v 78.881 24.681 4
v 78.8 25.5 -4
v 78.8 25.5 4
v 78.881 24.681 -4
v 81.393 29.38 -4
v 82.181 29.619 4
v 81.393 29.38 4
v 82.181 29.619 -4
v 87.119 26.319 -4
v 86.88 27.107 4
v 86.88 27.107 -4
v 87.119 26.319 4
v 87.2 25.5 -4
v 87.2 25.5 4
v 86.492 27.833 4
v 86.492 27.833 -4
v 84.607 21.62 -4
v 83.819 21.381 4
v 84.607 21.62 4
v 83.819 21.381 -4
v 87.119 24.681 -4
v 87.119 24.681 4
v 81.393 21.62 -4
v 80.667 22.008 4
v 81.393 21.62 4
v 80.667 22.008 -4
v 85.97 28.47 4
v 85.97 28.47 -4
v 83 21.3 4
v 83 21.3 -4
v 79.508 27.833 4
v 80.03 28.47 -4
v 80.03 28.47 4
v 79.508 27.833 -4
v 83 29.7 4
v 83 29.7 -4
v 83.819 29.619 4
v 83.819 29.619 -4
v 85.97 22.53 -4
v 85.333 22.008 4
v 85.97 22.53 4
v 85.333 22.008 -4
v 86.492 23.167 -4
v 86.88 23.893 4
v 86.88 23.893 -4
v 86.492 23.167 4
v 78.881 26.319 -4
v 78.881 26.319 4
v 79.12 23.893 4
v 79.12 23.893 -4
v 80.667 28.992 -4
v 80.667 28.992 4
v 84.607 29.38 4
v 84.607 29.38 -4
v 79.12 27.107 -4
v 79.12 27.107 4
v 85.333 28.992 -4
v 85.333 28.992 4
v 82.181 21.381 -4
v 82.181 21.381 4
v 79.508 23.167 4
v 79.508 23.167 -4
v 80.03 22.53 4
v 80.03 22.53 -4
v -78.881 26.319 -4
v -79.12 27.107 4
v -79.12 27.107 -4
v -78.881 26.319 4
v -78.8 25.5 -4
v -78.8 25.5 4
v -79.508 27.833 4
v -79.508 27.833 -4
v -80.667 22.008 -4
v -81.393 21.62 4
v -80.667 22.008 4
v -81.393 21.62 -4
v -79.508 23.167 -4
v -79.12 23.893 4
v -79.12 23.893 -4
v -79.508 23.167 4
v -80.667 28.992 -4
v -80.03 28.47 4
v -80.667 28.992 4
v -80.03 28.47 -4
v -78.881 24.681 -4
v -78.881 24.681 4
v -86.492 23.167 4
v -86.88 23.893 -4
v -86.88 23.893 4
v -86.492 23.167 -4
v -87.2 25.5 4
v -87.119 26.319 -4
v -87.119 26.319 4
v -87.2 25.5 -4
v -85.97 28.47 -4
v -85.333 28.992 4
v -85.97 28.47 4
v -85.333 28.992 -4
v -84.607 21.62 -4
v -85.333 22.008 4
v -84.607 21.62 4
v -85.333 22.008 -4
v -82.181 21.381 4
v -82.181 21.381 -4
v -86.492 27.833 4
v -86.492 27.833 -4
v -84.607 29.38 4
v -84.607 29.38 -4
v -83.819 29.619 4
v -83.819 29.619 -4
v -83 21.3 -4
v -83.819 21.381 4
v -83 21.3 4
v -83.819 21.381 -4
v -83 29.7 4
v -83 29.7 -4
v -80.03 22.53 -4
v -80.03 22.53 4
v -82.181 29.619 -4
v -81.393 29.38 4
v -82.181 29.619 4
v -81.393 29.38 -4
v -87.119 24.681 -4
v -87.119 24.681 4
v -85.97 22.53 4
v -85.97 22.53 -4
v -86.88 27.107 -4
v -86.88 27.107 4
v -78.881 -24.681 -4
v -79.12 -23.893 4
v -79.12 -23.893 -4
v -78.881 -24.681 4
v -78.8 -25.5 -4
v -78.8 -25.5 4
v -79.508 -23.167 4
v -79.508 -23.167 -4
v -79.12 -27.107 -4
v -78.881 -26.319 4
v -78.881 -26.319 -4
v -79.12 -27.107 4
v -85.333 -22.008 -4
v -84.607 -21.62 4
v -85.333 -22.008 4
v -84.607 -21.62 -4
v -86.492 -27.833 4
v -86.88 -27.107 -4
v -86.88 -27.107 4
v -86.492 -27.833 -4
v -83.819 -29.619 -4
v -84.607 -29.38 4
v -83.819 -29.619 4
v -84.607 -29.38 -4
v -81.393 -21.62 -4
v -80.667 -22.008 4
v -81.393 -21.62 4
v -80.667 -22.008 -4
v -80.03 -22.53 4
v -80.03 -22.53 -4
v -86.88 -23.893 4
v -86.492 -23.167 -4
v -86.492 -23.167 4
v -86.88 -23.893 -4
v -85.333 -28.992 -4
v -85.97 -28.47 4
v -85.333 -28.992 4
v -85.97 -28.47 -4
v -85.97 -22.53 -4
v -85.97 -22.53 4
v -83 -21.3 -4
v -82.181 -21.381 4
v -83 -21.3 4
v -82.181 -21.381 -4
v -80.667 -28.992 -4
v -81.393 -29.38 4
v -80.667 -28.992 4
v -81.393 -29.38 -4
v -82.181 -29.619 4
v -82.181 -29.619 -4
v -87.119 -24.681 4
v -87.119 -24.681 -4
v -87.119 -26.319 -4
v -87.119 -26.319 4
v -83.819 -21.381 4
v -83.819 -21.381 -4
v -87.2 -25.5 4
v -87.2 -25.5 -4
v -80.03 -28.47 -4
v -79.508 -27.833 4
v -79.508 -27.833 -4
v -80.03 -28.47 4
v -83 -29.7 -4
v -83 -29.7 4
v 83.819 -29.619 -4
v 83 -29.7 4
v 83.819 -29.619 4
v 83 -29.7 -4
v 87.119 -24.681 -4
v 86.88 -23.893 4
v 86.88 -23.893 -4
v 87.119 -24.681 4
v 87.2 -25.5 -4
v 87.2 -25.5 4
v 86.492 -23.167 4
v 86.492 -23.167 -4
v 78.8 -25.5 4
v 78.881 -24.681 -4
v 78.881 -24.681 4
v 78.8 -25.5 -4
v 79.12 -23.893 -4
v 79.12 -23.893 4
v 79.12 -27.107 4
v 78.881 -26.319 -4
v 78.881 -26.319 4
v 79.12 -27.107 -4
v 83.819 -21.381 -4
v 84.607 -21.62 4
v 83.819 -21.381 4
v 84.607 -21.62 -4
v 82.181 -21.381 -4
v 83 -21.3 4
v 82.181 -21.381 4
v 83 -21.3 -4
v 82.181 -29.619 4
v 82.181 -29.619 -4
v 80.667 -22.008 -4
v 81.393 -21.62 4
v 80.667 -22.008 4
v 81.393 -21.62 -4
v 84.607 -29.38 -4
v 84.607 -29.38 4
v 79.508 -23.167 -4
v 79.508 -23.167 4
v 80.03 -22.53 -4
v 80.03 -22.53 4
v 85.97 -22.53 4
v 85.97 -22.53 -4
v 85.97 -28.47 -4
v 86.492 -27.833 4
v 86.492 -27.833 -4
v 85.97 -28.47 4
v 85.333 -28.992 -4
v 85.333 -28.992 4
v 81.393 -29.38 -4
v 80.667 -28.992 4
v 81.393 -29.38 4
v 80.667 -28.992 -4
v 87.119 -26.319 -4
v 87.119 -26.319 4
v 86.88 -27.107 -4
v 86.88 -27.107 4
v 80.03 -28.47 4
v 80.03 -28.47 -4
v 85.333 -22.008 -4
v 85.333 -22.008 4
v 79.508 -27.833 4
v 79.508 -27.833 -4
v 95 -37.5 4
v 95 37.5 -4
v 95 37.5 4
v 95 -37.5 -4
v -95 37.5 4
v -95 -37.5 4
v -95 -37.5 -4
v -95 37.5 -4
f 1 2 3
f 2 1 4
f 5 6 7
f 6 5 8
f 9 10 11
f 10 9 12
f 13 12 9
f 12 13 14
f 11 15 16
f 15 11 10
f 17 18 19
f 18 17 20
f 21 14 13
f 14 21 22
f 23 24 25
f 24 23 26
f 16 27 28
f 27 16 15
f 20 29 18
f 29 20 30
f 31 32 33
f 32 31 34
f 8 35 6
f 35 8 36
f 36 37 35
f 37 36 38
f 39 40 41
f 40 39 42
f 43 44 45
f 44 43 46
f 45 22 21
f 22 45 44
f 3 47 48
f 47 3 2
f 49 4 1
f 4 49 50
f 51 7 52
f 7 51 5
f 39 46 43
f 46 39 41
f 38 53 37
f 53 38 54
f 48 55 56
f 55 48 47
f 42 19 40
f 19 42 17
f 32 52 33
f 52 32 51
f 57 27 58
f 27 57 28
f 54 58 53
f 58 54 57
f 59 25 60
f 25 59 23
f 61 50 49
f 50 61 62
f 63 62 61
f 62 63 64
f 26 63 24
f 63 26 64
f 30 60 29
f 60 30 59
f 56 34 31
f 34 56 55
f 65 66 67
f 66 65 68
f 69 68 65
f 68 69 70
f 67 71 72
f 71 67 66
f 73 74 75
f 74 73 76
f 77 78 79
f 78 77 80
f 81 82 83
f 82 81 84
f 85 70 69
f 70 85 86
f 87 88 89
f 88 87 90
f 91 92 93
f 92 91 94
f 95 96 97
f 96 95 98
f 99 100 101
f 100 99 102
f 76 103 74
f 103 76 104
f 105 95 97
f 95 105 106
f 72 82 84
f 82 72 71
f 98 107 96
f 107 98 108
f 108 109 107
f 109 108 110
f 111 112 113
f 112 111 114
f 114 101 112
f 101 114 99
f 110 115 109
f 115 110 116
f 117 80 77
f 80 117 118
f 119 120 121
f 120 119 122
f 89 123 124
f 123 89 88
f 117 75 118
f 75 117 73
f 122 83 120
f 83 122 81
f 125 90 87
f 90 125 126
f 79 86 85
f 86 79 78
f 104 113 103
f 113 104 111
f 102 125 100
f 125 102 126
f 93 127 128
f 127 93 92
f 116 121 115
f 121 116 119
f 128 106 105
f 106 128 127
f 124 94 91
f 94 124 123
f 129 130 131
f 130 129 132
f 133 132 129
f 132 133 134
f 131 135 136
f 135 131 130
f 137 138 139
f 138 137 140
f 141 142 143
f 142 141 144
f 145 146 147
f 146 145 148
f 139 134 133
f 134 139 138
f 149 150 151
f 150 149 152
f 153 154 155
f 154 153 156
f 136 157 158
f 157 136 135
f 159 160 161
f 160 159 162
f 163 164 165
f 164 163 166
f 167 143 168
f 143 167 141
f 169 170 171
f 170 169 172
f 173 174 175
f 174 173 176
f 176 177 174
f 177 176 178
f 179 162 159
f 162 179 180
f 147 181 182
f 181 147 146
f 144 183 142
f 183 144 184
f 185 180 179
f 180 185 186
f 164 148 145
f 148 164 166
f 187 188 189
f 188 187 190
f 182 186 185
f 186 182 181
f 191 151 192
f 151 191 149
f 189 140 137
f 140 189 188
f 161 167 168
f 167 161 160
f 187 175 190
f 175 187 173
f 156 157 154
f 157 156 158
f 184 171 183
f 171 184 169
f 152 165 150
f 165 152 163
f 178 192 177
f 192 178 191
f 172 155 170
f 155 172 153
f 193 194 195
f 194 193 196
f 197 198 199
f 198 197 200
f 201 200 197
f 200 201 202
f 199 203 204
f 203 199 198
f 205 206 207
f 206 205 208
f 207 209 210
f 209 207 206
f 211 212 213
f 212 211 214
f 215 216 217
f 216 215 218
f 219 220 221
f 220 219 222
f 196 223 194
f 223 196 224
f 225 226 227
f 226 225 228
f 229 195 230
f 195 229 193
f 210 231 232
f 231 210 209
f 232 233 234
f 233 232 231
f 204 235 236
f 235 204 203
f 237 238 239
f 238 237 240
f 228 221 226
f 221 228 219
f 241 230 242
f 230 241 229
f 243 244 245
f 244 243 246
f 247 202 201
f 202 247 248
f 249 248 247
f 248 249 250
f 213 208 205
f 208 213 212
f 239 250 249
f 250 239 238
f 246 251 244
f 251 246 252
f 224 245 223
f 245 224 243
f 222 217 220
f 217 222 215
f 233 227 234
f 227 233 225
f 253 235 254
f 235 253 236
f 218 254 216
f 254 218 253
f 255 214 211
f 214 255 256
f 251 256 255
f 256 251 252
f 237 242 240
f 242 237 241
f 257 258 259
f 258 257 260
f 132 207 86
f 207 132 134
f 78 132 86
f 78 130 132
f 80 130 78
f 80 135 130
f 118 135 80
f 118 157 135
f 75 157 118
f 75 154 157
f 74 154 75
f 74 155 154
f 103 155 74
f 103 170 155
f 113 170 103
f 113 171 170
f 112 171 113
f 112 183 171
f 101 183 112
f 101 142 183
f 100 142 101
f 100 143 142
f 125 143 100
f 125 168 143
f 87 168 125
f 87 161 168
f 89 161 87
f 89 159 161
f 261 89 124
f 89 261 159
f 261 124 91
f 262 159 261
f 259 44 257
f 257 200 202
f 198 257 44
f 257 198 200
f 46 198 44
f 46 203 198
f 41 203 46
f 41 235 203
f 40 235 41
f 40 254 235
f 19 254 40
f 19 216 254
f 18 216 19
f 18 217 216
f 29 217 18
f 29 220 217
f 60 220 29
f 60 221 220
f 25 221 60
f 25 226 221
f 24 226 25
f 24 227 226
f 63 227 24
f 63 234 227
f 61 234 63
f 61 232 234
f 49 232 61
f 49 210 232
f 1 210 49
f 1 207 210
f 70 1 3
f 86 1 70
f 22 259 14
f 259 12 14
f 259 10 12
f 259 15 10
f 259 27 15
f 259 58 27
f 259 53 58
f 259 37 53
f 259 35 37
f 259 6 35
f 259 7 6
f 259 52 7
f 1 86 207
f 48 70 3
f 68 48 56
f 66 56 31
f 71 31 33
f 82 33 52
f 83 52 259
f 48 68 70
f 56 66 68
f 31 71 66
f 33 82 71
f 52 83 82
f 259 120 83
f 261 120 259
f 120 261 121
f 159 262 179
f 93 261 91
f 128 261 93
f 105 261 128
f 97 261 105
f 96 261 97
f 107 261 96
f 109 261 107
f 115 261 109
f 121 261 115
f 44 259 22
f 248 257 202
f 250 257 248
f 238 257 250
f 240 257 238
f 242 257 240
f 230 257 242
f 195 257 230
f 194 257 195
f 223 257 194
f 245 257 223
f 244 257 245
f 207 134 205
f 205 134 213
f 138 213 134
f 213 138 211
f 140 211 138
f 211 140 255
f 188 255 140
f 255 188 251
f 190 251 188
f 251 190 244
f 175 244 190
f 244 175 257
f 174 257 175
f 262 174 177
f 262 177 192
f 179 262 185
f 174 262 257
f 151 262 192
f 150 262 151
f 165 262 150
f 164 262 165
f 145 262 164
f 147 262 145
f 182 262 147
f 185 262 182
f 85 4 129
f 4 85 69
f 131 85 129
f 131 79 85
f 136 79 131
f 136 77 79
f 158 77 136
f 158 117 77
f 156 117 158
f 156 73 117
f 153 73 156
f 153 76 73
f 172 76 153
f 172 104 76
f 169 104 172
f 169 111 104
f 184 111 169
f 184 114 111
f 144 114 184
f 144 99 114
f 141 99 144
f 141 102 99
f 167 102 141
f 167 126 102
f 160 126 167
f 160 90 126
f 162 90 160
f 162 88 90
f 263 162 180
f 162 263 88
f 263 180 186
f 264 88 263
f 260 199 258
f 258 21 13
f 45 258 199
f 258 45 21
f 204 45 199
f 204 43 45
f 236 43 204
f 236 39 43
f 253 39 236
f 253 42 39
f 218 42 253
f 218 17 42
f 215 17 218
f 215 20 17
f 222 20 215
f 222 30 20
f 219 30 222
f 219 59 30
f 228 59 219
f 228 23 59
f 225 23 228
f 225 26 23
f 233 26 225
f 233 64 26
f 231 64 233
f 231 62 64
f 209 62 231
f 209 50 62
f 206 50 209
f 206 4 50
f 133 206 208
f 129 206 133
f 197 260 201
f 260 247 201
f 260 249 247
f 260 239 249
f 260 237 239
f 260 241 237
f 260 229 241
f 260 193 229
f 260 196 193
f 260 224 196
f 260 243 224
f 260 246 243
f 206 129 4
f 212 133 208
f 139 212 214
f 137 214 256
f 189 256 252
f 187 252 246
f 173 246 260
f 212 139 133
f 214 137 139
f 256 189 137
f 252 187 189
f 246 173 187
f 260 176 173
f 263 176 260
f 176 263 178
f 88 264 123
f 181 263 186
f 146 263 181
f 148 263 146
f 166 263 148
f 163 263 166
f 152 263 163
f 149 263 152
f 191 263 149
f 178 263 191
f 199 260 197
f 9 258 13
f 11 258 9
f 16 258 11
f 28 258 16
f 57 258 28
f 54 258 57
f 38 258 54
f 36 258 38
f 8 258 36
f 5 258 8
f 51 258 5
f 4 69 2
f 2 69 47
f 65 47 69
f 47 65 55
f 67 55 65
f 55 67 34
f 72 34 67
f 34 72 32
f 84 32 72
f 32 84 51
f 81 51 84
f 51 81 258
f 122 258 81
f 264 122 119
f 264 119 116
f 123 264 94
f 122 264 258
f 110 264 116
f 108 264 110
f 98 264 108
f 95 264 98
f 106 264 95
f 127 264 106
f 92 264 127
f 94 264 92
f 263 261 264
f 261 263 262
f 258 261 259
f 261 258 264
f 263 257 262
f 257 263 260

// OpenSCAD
$fn = 32;

// ----------------------------------------------------------------------
// Corner plate 190 x 75 x 8
// 4 holes, centres taken from the edge offset
// ----------------------------------------------------------------------

// --- parameters (mm) ---
plate = [190, 75, 8];  // overall size (x, y, z)
holes = 4;             // number of holes the drawing asks for
hole_d = 8.4;          // hole diameter
edge = 12;             // hole centre offset from the plate edge

// --- derived feature positions (mm) ---
corner_x = plate[0] / 2 - edge;  // = 83   corner hole X
corner_y = plate[1] / 2 - edge;  // = 25.5   corner hole Y
feature_centers = [
  [corner_x, corner_y],
  [-corner_x, corner_y],
  [-corner_x, -corner_y],
  [corner_x, -corner_y]
];   // hole centres the loop below drills

// plate outline, every hole drilled through with the same cutters
difference() {
  cube(plate, center = true);
  for (centre = feature_centers)
    translate([centre[0], centre[1], 0])
      cylinder(d = hole_d, h = plate[2] + 2, center = true);
}
